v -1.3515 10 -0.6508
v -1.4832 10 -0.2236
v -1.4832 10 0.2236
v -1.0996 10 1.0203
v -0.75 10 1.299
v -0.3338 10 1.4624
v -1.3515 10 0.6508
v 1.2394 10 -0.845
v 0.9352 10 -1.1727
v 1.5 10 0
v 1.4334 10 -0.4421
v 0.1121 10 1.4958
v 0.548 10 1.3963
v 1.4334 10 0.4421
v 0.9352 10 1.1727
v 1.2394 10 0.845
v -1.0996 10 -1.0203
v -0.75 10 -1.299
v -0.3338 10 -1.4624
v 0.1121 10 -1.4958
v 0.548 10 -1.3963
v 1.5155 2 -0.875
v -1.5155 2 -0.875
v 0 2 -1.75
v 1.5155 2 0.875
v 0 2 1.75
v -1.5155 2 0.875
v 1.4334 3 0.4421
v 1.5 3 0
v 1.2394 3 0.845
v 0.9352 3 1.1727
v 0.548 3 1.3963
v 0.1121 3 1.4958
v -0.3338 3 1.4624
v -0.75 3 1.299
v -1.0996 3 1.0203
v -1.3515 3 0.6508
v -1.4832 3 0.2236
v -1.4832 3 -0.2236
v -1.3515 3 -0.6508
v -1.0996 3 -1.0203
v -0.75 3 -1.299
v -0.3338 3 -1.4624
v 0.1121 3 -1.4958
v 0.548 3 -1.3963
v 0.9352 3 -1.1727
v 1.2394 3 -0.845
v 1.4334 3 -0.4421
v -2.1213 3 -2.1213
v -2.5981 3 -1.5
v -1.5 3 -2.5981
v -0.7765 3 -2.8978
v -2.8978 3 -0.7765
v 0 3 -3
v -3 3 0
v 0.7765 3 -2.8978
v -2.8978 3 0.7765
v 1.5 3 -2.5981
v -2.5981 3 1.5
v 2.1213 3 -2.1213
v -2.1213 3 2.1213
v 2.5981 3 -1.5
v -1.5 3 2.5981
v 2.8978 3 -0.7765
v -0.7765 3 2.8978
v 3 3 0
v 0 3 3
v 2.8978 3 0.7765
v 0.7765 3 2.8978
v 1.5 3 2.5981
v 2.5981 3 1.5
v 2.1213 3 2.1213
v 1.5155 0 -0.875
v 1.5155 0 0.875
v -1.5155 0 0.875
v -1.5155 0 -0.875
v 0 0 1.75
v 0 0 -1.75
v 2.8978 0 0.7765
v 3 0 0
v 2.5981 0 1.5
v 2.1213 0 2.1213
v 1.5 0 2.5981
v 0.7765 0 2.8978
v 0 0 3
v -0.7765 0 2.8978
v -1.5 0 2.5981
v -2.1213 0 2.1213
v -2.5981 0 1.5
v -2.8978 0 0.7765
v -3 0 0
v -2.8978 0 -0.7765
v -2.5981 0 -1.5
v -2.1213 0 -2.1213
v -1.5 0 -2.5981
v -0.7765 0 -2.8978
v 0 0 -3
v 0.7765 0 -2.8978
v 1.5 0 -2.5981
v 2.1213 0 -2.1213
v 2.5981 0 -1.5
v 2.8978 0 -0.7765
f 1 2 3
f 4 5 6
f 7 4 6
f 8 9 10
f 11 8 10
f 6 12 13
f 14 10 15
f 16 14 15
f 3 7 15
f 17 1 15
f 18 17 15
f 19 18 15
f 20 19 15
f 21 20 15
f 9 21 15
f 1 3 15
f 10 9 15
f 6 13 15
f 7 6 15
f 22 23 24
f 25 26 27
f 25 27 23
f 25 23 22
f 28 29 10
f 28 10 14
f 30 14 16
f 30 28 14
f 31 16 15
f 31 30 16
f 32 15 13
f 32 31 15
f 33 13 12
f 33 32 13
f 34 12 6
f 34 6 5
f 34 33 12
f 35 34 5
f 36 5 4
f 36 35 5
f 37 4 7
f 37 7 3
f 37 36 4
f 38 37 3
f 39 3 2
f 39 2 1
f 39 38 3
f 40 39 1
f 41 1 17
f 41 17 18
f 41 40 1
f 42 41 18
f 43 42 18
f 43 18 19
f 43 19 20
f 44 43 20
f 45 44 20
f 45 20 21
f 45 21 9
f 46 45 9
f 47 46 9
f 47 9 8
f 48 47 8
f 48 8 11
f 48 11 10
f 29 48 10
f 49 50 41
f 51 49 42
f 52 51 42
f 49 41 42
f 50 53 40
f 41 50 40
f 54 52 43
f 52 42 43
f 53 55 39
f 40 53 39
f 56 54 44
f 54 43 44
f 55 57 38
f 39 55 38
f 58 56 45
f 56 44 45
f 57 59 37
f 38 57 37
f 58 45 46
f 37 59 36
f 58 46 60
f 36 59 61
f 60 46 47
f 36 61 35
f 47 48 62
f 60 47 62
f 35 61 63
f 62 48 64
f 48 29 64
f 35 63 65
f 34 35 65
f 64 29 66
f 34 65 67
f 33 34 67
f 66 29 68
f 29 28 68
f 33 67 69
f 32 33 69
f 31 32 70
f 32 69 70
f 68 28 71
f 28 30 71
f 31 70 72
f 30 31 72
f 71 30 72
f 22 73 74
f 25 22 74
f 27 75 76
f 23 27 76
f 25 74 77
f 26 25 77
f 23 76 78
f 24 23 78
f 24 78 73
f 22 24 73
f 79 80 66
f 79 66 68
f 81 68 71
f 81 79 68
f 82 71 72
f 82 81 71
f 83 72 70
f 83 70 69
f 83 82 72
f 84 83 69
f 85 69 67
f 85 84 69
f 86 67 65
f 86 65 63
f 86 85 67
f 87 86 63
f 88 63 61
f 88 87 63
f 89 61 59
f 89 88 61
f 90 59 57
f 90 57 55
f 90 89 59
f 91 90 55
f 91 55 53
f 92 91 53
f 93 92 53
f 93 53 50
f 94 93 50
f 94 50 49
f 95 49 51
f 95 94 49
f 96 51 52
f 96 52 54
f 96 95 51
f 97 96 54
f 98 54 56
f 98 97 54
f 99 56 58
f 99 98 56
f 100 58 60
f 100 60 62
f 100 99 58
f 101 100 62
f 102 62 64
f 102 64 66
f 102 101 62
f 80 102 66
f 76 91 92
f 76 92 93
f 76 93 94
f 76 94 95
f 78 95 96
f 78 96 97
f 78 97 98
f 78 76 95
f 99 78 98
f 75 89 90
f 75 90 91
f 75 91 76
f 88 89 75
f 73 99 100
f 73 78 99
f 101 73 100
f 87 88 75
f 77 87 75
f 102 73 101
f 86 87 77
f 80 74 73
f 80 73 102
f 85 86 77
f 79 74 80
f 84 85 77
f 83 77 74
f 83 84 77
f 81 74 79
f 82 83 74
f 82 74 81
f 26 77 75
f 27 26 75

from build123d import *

# Parameters (mm, degrees)
F0_R     = 1.5
F1_DEPTH = 10
F2_R     = 3
F2_R_2   = 1.5
F3_DEPTH = 3
F4_R     = 1.5
F5_DEPTH = 2


with BuildPart() as f1:
    # F0 (on Front) → F1 (new body)
    with BuildSketch(Plane.XZ):
        Circle(F0_R)
    extrude(amount=-F1_DEPTH)

    # F2 (on face) → F3 (join)
    with BuildSketch(Plane.XZ):
        Circle(F2_R)
        Polygon((1.375, 2.3815698604), (2.75, 0), (1.375, -2.3815698604), (-1.375, -2.3815698604), (-2.75, 0), (-1.375, 2.3815698604), align=None, mode=Mode.SUBTRACT)
        Polygon((1.375, -2.3815698604), (2.75, 0), (1.375, 2.3815698604), (-1.375, 2.3815698604), (-2.75, 0), (-1.375, -2.3815698604), align=None)
        Circle(F2_R_2, mode=Mode.SUBTRACT)
    extrude(amount=-F3_DEPTH)

    # F4 (on face) → F5 (cut)
    with BuildSketch(Plane.XZ):
        Polygon((-1.5155444566, -0.875), (0, -1.75), (1.5155444566, -0.875), (1.5155444566, 0.875), (0, 1.75), (-1.5155444566, 0.875), align=None)
        Circle(F4_R, mode=Mode.SUBTRACT)
        Circle(F4_R)
    extrude(amount=-F5_DEPTH, mode=Mode.SUBTRACT)


solid = f1.part
